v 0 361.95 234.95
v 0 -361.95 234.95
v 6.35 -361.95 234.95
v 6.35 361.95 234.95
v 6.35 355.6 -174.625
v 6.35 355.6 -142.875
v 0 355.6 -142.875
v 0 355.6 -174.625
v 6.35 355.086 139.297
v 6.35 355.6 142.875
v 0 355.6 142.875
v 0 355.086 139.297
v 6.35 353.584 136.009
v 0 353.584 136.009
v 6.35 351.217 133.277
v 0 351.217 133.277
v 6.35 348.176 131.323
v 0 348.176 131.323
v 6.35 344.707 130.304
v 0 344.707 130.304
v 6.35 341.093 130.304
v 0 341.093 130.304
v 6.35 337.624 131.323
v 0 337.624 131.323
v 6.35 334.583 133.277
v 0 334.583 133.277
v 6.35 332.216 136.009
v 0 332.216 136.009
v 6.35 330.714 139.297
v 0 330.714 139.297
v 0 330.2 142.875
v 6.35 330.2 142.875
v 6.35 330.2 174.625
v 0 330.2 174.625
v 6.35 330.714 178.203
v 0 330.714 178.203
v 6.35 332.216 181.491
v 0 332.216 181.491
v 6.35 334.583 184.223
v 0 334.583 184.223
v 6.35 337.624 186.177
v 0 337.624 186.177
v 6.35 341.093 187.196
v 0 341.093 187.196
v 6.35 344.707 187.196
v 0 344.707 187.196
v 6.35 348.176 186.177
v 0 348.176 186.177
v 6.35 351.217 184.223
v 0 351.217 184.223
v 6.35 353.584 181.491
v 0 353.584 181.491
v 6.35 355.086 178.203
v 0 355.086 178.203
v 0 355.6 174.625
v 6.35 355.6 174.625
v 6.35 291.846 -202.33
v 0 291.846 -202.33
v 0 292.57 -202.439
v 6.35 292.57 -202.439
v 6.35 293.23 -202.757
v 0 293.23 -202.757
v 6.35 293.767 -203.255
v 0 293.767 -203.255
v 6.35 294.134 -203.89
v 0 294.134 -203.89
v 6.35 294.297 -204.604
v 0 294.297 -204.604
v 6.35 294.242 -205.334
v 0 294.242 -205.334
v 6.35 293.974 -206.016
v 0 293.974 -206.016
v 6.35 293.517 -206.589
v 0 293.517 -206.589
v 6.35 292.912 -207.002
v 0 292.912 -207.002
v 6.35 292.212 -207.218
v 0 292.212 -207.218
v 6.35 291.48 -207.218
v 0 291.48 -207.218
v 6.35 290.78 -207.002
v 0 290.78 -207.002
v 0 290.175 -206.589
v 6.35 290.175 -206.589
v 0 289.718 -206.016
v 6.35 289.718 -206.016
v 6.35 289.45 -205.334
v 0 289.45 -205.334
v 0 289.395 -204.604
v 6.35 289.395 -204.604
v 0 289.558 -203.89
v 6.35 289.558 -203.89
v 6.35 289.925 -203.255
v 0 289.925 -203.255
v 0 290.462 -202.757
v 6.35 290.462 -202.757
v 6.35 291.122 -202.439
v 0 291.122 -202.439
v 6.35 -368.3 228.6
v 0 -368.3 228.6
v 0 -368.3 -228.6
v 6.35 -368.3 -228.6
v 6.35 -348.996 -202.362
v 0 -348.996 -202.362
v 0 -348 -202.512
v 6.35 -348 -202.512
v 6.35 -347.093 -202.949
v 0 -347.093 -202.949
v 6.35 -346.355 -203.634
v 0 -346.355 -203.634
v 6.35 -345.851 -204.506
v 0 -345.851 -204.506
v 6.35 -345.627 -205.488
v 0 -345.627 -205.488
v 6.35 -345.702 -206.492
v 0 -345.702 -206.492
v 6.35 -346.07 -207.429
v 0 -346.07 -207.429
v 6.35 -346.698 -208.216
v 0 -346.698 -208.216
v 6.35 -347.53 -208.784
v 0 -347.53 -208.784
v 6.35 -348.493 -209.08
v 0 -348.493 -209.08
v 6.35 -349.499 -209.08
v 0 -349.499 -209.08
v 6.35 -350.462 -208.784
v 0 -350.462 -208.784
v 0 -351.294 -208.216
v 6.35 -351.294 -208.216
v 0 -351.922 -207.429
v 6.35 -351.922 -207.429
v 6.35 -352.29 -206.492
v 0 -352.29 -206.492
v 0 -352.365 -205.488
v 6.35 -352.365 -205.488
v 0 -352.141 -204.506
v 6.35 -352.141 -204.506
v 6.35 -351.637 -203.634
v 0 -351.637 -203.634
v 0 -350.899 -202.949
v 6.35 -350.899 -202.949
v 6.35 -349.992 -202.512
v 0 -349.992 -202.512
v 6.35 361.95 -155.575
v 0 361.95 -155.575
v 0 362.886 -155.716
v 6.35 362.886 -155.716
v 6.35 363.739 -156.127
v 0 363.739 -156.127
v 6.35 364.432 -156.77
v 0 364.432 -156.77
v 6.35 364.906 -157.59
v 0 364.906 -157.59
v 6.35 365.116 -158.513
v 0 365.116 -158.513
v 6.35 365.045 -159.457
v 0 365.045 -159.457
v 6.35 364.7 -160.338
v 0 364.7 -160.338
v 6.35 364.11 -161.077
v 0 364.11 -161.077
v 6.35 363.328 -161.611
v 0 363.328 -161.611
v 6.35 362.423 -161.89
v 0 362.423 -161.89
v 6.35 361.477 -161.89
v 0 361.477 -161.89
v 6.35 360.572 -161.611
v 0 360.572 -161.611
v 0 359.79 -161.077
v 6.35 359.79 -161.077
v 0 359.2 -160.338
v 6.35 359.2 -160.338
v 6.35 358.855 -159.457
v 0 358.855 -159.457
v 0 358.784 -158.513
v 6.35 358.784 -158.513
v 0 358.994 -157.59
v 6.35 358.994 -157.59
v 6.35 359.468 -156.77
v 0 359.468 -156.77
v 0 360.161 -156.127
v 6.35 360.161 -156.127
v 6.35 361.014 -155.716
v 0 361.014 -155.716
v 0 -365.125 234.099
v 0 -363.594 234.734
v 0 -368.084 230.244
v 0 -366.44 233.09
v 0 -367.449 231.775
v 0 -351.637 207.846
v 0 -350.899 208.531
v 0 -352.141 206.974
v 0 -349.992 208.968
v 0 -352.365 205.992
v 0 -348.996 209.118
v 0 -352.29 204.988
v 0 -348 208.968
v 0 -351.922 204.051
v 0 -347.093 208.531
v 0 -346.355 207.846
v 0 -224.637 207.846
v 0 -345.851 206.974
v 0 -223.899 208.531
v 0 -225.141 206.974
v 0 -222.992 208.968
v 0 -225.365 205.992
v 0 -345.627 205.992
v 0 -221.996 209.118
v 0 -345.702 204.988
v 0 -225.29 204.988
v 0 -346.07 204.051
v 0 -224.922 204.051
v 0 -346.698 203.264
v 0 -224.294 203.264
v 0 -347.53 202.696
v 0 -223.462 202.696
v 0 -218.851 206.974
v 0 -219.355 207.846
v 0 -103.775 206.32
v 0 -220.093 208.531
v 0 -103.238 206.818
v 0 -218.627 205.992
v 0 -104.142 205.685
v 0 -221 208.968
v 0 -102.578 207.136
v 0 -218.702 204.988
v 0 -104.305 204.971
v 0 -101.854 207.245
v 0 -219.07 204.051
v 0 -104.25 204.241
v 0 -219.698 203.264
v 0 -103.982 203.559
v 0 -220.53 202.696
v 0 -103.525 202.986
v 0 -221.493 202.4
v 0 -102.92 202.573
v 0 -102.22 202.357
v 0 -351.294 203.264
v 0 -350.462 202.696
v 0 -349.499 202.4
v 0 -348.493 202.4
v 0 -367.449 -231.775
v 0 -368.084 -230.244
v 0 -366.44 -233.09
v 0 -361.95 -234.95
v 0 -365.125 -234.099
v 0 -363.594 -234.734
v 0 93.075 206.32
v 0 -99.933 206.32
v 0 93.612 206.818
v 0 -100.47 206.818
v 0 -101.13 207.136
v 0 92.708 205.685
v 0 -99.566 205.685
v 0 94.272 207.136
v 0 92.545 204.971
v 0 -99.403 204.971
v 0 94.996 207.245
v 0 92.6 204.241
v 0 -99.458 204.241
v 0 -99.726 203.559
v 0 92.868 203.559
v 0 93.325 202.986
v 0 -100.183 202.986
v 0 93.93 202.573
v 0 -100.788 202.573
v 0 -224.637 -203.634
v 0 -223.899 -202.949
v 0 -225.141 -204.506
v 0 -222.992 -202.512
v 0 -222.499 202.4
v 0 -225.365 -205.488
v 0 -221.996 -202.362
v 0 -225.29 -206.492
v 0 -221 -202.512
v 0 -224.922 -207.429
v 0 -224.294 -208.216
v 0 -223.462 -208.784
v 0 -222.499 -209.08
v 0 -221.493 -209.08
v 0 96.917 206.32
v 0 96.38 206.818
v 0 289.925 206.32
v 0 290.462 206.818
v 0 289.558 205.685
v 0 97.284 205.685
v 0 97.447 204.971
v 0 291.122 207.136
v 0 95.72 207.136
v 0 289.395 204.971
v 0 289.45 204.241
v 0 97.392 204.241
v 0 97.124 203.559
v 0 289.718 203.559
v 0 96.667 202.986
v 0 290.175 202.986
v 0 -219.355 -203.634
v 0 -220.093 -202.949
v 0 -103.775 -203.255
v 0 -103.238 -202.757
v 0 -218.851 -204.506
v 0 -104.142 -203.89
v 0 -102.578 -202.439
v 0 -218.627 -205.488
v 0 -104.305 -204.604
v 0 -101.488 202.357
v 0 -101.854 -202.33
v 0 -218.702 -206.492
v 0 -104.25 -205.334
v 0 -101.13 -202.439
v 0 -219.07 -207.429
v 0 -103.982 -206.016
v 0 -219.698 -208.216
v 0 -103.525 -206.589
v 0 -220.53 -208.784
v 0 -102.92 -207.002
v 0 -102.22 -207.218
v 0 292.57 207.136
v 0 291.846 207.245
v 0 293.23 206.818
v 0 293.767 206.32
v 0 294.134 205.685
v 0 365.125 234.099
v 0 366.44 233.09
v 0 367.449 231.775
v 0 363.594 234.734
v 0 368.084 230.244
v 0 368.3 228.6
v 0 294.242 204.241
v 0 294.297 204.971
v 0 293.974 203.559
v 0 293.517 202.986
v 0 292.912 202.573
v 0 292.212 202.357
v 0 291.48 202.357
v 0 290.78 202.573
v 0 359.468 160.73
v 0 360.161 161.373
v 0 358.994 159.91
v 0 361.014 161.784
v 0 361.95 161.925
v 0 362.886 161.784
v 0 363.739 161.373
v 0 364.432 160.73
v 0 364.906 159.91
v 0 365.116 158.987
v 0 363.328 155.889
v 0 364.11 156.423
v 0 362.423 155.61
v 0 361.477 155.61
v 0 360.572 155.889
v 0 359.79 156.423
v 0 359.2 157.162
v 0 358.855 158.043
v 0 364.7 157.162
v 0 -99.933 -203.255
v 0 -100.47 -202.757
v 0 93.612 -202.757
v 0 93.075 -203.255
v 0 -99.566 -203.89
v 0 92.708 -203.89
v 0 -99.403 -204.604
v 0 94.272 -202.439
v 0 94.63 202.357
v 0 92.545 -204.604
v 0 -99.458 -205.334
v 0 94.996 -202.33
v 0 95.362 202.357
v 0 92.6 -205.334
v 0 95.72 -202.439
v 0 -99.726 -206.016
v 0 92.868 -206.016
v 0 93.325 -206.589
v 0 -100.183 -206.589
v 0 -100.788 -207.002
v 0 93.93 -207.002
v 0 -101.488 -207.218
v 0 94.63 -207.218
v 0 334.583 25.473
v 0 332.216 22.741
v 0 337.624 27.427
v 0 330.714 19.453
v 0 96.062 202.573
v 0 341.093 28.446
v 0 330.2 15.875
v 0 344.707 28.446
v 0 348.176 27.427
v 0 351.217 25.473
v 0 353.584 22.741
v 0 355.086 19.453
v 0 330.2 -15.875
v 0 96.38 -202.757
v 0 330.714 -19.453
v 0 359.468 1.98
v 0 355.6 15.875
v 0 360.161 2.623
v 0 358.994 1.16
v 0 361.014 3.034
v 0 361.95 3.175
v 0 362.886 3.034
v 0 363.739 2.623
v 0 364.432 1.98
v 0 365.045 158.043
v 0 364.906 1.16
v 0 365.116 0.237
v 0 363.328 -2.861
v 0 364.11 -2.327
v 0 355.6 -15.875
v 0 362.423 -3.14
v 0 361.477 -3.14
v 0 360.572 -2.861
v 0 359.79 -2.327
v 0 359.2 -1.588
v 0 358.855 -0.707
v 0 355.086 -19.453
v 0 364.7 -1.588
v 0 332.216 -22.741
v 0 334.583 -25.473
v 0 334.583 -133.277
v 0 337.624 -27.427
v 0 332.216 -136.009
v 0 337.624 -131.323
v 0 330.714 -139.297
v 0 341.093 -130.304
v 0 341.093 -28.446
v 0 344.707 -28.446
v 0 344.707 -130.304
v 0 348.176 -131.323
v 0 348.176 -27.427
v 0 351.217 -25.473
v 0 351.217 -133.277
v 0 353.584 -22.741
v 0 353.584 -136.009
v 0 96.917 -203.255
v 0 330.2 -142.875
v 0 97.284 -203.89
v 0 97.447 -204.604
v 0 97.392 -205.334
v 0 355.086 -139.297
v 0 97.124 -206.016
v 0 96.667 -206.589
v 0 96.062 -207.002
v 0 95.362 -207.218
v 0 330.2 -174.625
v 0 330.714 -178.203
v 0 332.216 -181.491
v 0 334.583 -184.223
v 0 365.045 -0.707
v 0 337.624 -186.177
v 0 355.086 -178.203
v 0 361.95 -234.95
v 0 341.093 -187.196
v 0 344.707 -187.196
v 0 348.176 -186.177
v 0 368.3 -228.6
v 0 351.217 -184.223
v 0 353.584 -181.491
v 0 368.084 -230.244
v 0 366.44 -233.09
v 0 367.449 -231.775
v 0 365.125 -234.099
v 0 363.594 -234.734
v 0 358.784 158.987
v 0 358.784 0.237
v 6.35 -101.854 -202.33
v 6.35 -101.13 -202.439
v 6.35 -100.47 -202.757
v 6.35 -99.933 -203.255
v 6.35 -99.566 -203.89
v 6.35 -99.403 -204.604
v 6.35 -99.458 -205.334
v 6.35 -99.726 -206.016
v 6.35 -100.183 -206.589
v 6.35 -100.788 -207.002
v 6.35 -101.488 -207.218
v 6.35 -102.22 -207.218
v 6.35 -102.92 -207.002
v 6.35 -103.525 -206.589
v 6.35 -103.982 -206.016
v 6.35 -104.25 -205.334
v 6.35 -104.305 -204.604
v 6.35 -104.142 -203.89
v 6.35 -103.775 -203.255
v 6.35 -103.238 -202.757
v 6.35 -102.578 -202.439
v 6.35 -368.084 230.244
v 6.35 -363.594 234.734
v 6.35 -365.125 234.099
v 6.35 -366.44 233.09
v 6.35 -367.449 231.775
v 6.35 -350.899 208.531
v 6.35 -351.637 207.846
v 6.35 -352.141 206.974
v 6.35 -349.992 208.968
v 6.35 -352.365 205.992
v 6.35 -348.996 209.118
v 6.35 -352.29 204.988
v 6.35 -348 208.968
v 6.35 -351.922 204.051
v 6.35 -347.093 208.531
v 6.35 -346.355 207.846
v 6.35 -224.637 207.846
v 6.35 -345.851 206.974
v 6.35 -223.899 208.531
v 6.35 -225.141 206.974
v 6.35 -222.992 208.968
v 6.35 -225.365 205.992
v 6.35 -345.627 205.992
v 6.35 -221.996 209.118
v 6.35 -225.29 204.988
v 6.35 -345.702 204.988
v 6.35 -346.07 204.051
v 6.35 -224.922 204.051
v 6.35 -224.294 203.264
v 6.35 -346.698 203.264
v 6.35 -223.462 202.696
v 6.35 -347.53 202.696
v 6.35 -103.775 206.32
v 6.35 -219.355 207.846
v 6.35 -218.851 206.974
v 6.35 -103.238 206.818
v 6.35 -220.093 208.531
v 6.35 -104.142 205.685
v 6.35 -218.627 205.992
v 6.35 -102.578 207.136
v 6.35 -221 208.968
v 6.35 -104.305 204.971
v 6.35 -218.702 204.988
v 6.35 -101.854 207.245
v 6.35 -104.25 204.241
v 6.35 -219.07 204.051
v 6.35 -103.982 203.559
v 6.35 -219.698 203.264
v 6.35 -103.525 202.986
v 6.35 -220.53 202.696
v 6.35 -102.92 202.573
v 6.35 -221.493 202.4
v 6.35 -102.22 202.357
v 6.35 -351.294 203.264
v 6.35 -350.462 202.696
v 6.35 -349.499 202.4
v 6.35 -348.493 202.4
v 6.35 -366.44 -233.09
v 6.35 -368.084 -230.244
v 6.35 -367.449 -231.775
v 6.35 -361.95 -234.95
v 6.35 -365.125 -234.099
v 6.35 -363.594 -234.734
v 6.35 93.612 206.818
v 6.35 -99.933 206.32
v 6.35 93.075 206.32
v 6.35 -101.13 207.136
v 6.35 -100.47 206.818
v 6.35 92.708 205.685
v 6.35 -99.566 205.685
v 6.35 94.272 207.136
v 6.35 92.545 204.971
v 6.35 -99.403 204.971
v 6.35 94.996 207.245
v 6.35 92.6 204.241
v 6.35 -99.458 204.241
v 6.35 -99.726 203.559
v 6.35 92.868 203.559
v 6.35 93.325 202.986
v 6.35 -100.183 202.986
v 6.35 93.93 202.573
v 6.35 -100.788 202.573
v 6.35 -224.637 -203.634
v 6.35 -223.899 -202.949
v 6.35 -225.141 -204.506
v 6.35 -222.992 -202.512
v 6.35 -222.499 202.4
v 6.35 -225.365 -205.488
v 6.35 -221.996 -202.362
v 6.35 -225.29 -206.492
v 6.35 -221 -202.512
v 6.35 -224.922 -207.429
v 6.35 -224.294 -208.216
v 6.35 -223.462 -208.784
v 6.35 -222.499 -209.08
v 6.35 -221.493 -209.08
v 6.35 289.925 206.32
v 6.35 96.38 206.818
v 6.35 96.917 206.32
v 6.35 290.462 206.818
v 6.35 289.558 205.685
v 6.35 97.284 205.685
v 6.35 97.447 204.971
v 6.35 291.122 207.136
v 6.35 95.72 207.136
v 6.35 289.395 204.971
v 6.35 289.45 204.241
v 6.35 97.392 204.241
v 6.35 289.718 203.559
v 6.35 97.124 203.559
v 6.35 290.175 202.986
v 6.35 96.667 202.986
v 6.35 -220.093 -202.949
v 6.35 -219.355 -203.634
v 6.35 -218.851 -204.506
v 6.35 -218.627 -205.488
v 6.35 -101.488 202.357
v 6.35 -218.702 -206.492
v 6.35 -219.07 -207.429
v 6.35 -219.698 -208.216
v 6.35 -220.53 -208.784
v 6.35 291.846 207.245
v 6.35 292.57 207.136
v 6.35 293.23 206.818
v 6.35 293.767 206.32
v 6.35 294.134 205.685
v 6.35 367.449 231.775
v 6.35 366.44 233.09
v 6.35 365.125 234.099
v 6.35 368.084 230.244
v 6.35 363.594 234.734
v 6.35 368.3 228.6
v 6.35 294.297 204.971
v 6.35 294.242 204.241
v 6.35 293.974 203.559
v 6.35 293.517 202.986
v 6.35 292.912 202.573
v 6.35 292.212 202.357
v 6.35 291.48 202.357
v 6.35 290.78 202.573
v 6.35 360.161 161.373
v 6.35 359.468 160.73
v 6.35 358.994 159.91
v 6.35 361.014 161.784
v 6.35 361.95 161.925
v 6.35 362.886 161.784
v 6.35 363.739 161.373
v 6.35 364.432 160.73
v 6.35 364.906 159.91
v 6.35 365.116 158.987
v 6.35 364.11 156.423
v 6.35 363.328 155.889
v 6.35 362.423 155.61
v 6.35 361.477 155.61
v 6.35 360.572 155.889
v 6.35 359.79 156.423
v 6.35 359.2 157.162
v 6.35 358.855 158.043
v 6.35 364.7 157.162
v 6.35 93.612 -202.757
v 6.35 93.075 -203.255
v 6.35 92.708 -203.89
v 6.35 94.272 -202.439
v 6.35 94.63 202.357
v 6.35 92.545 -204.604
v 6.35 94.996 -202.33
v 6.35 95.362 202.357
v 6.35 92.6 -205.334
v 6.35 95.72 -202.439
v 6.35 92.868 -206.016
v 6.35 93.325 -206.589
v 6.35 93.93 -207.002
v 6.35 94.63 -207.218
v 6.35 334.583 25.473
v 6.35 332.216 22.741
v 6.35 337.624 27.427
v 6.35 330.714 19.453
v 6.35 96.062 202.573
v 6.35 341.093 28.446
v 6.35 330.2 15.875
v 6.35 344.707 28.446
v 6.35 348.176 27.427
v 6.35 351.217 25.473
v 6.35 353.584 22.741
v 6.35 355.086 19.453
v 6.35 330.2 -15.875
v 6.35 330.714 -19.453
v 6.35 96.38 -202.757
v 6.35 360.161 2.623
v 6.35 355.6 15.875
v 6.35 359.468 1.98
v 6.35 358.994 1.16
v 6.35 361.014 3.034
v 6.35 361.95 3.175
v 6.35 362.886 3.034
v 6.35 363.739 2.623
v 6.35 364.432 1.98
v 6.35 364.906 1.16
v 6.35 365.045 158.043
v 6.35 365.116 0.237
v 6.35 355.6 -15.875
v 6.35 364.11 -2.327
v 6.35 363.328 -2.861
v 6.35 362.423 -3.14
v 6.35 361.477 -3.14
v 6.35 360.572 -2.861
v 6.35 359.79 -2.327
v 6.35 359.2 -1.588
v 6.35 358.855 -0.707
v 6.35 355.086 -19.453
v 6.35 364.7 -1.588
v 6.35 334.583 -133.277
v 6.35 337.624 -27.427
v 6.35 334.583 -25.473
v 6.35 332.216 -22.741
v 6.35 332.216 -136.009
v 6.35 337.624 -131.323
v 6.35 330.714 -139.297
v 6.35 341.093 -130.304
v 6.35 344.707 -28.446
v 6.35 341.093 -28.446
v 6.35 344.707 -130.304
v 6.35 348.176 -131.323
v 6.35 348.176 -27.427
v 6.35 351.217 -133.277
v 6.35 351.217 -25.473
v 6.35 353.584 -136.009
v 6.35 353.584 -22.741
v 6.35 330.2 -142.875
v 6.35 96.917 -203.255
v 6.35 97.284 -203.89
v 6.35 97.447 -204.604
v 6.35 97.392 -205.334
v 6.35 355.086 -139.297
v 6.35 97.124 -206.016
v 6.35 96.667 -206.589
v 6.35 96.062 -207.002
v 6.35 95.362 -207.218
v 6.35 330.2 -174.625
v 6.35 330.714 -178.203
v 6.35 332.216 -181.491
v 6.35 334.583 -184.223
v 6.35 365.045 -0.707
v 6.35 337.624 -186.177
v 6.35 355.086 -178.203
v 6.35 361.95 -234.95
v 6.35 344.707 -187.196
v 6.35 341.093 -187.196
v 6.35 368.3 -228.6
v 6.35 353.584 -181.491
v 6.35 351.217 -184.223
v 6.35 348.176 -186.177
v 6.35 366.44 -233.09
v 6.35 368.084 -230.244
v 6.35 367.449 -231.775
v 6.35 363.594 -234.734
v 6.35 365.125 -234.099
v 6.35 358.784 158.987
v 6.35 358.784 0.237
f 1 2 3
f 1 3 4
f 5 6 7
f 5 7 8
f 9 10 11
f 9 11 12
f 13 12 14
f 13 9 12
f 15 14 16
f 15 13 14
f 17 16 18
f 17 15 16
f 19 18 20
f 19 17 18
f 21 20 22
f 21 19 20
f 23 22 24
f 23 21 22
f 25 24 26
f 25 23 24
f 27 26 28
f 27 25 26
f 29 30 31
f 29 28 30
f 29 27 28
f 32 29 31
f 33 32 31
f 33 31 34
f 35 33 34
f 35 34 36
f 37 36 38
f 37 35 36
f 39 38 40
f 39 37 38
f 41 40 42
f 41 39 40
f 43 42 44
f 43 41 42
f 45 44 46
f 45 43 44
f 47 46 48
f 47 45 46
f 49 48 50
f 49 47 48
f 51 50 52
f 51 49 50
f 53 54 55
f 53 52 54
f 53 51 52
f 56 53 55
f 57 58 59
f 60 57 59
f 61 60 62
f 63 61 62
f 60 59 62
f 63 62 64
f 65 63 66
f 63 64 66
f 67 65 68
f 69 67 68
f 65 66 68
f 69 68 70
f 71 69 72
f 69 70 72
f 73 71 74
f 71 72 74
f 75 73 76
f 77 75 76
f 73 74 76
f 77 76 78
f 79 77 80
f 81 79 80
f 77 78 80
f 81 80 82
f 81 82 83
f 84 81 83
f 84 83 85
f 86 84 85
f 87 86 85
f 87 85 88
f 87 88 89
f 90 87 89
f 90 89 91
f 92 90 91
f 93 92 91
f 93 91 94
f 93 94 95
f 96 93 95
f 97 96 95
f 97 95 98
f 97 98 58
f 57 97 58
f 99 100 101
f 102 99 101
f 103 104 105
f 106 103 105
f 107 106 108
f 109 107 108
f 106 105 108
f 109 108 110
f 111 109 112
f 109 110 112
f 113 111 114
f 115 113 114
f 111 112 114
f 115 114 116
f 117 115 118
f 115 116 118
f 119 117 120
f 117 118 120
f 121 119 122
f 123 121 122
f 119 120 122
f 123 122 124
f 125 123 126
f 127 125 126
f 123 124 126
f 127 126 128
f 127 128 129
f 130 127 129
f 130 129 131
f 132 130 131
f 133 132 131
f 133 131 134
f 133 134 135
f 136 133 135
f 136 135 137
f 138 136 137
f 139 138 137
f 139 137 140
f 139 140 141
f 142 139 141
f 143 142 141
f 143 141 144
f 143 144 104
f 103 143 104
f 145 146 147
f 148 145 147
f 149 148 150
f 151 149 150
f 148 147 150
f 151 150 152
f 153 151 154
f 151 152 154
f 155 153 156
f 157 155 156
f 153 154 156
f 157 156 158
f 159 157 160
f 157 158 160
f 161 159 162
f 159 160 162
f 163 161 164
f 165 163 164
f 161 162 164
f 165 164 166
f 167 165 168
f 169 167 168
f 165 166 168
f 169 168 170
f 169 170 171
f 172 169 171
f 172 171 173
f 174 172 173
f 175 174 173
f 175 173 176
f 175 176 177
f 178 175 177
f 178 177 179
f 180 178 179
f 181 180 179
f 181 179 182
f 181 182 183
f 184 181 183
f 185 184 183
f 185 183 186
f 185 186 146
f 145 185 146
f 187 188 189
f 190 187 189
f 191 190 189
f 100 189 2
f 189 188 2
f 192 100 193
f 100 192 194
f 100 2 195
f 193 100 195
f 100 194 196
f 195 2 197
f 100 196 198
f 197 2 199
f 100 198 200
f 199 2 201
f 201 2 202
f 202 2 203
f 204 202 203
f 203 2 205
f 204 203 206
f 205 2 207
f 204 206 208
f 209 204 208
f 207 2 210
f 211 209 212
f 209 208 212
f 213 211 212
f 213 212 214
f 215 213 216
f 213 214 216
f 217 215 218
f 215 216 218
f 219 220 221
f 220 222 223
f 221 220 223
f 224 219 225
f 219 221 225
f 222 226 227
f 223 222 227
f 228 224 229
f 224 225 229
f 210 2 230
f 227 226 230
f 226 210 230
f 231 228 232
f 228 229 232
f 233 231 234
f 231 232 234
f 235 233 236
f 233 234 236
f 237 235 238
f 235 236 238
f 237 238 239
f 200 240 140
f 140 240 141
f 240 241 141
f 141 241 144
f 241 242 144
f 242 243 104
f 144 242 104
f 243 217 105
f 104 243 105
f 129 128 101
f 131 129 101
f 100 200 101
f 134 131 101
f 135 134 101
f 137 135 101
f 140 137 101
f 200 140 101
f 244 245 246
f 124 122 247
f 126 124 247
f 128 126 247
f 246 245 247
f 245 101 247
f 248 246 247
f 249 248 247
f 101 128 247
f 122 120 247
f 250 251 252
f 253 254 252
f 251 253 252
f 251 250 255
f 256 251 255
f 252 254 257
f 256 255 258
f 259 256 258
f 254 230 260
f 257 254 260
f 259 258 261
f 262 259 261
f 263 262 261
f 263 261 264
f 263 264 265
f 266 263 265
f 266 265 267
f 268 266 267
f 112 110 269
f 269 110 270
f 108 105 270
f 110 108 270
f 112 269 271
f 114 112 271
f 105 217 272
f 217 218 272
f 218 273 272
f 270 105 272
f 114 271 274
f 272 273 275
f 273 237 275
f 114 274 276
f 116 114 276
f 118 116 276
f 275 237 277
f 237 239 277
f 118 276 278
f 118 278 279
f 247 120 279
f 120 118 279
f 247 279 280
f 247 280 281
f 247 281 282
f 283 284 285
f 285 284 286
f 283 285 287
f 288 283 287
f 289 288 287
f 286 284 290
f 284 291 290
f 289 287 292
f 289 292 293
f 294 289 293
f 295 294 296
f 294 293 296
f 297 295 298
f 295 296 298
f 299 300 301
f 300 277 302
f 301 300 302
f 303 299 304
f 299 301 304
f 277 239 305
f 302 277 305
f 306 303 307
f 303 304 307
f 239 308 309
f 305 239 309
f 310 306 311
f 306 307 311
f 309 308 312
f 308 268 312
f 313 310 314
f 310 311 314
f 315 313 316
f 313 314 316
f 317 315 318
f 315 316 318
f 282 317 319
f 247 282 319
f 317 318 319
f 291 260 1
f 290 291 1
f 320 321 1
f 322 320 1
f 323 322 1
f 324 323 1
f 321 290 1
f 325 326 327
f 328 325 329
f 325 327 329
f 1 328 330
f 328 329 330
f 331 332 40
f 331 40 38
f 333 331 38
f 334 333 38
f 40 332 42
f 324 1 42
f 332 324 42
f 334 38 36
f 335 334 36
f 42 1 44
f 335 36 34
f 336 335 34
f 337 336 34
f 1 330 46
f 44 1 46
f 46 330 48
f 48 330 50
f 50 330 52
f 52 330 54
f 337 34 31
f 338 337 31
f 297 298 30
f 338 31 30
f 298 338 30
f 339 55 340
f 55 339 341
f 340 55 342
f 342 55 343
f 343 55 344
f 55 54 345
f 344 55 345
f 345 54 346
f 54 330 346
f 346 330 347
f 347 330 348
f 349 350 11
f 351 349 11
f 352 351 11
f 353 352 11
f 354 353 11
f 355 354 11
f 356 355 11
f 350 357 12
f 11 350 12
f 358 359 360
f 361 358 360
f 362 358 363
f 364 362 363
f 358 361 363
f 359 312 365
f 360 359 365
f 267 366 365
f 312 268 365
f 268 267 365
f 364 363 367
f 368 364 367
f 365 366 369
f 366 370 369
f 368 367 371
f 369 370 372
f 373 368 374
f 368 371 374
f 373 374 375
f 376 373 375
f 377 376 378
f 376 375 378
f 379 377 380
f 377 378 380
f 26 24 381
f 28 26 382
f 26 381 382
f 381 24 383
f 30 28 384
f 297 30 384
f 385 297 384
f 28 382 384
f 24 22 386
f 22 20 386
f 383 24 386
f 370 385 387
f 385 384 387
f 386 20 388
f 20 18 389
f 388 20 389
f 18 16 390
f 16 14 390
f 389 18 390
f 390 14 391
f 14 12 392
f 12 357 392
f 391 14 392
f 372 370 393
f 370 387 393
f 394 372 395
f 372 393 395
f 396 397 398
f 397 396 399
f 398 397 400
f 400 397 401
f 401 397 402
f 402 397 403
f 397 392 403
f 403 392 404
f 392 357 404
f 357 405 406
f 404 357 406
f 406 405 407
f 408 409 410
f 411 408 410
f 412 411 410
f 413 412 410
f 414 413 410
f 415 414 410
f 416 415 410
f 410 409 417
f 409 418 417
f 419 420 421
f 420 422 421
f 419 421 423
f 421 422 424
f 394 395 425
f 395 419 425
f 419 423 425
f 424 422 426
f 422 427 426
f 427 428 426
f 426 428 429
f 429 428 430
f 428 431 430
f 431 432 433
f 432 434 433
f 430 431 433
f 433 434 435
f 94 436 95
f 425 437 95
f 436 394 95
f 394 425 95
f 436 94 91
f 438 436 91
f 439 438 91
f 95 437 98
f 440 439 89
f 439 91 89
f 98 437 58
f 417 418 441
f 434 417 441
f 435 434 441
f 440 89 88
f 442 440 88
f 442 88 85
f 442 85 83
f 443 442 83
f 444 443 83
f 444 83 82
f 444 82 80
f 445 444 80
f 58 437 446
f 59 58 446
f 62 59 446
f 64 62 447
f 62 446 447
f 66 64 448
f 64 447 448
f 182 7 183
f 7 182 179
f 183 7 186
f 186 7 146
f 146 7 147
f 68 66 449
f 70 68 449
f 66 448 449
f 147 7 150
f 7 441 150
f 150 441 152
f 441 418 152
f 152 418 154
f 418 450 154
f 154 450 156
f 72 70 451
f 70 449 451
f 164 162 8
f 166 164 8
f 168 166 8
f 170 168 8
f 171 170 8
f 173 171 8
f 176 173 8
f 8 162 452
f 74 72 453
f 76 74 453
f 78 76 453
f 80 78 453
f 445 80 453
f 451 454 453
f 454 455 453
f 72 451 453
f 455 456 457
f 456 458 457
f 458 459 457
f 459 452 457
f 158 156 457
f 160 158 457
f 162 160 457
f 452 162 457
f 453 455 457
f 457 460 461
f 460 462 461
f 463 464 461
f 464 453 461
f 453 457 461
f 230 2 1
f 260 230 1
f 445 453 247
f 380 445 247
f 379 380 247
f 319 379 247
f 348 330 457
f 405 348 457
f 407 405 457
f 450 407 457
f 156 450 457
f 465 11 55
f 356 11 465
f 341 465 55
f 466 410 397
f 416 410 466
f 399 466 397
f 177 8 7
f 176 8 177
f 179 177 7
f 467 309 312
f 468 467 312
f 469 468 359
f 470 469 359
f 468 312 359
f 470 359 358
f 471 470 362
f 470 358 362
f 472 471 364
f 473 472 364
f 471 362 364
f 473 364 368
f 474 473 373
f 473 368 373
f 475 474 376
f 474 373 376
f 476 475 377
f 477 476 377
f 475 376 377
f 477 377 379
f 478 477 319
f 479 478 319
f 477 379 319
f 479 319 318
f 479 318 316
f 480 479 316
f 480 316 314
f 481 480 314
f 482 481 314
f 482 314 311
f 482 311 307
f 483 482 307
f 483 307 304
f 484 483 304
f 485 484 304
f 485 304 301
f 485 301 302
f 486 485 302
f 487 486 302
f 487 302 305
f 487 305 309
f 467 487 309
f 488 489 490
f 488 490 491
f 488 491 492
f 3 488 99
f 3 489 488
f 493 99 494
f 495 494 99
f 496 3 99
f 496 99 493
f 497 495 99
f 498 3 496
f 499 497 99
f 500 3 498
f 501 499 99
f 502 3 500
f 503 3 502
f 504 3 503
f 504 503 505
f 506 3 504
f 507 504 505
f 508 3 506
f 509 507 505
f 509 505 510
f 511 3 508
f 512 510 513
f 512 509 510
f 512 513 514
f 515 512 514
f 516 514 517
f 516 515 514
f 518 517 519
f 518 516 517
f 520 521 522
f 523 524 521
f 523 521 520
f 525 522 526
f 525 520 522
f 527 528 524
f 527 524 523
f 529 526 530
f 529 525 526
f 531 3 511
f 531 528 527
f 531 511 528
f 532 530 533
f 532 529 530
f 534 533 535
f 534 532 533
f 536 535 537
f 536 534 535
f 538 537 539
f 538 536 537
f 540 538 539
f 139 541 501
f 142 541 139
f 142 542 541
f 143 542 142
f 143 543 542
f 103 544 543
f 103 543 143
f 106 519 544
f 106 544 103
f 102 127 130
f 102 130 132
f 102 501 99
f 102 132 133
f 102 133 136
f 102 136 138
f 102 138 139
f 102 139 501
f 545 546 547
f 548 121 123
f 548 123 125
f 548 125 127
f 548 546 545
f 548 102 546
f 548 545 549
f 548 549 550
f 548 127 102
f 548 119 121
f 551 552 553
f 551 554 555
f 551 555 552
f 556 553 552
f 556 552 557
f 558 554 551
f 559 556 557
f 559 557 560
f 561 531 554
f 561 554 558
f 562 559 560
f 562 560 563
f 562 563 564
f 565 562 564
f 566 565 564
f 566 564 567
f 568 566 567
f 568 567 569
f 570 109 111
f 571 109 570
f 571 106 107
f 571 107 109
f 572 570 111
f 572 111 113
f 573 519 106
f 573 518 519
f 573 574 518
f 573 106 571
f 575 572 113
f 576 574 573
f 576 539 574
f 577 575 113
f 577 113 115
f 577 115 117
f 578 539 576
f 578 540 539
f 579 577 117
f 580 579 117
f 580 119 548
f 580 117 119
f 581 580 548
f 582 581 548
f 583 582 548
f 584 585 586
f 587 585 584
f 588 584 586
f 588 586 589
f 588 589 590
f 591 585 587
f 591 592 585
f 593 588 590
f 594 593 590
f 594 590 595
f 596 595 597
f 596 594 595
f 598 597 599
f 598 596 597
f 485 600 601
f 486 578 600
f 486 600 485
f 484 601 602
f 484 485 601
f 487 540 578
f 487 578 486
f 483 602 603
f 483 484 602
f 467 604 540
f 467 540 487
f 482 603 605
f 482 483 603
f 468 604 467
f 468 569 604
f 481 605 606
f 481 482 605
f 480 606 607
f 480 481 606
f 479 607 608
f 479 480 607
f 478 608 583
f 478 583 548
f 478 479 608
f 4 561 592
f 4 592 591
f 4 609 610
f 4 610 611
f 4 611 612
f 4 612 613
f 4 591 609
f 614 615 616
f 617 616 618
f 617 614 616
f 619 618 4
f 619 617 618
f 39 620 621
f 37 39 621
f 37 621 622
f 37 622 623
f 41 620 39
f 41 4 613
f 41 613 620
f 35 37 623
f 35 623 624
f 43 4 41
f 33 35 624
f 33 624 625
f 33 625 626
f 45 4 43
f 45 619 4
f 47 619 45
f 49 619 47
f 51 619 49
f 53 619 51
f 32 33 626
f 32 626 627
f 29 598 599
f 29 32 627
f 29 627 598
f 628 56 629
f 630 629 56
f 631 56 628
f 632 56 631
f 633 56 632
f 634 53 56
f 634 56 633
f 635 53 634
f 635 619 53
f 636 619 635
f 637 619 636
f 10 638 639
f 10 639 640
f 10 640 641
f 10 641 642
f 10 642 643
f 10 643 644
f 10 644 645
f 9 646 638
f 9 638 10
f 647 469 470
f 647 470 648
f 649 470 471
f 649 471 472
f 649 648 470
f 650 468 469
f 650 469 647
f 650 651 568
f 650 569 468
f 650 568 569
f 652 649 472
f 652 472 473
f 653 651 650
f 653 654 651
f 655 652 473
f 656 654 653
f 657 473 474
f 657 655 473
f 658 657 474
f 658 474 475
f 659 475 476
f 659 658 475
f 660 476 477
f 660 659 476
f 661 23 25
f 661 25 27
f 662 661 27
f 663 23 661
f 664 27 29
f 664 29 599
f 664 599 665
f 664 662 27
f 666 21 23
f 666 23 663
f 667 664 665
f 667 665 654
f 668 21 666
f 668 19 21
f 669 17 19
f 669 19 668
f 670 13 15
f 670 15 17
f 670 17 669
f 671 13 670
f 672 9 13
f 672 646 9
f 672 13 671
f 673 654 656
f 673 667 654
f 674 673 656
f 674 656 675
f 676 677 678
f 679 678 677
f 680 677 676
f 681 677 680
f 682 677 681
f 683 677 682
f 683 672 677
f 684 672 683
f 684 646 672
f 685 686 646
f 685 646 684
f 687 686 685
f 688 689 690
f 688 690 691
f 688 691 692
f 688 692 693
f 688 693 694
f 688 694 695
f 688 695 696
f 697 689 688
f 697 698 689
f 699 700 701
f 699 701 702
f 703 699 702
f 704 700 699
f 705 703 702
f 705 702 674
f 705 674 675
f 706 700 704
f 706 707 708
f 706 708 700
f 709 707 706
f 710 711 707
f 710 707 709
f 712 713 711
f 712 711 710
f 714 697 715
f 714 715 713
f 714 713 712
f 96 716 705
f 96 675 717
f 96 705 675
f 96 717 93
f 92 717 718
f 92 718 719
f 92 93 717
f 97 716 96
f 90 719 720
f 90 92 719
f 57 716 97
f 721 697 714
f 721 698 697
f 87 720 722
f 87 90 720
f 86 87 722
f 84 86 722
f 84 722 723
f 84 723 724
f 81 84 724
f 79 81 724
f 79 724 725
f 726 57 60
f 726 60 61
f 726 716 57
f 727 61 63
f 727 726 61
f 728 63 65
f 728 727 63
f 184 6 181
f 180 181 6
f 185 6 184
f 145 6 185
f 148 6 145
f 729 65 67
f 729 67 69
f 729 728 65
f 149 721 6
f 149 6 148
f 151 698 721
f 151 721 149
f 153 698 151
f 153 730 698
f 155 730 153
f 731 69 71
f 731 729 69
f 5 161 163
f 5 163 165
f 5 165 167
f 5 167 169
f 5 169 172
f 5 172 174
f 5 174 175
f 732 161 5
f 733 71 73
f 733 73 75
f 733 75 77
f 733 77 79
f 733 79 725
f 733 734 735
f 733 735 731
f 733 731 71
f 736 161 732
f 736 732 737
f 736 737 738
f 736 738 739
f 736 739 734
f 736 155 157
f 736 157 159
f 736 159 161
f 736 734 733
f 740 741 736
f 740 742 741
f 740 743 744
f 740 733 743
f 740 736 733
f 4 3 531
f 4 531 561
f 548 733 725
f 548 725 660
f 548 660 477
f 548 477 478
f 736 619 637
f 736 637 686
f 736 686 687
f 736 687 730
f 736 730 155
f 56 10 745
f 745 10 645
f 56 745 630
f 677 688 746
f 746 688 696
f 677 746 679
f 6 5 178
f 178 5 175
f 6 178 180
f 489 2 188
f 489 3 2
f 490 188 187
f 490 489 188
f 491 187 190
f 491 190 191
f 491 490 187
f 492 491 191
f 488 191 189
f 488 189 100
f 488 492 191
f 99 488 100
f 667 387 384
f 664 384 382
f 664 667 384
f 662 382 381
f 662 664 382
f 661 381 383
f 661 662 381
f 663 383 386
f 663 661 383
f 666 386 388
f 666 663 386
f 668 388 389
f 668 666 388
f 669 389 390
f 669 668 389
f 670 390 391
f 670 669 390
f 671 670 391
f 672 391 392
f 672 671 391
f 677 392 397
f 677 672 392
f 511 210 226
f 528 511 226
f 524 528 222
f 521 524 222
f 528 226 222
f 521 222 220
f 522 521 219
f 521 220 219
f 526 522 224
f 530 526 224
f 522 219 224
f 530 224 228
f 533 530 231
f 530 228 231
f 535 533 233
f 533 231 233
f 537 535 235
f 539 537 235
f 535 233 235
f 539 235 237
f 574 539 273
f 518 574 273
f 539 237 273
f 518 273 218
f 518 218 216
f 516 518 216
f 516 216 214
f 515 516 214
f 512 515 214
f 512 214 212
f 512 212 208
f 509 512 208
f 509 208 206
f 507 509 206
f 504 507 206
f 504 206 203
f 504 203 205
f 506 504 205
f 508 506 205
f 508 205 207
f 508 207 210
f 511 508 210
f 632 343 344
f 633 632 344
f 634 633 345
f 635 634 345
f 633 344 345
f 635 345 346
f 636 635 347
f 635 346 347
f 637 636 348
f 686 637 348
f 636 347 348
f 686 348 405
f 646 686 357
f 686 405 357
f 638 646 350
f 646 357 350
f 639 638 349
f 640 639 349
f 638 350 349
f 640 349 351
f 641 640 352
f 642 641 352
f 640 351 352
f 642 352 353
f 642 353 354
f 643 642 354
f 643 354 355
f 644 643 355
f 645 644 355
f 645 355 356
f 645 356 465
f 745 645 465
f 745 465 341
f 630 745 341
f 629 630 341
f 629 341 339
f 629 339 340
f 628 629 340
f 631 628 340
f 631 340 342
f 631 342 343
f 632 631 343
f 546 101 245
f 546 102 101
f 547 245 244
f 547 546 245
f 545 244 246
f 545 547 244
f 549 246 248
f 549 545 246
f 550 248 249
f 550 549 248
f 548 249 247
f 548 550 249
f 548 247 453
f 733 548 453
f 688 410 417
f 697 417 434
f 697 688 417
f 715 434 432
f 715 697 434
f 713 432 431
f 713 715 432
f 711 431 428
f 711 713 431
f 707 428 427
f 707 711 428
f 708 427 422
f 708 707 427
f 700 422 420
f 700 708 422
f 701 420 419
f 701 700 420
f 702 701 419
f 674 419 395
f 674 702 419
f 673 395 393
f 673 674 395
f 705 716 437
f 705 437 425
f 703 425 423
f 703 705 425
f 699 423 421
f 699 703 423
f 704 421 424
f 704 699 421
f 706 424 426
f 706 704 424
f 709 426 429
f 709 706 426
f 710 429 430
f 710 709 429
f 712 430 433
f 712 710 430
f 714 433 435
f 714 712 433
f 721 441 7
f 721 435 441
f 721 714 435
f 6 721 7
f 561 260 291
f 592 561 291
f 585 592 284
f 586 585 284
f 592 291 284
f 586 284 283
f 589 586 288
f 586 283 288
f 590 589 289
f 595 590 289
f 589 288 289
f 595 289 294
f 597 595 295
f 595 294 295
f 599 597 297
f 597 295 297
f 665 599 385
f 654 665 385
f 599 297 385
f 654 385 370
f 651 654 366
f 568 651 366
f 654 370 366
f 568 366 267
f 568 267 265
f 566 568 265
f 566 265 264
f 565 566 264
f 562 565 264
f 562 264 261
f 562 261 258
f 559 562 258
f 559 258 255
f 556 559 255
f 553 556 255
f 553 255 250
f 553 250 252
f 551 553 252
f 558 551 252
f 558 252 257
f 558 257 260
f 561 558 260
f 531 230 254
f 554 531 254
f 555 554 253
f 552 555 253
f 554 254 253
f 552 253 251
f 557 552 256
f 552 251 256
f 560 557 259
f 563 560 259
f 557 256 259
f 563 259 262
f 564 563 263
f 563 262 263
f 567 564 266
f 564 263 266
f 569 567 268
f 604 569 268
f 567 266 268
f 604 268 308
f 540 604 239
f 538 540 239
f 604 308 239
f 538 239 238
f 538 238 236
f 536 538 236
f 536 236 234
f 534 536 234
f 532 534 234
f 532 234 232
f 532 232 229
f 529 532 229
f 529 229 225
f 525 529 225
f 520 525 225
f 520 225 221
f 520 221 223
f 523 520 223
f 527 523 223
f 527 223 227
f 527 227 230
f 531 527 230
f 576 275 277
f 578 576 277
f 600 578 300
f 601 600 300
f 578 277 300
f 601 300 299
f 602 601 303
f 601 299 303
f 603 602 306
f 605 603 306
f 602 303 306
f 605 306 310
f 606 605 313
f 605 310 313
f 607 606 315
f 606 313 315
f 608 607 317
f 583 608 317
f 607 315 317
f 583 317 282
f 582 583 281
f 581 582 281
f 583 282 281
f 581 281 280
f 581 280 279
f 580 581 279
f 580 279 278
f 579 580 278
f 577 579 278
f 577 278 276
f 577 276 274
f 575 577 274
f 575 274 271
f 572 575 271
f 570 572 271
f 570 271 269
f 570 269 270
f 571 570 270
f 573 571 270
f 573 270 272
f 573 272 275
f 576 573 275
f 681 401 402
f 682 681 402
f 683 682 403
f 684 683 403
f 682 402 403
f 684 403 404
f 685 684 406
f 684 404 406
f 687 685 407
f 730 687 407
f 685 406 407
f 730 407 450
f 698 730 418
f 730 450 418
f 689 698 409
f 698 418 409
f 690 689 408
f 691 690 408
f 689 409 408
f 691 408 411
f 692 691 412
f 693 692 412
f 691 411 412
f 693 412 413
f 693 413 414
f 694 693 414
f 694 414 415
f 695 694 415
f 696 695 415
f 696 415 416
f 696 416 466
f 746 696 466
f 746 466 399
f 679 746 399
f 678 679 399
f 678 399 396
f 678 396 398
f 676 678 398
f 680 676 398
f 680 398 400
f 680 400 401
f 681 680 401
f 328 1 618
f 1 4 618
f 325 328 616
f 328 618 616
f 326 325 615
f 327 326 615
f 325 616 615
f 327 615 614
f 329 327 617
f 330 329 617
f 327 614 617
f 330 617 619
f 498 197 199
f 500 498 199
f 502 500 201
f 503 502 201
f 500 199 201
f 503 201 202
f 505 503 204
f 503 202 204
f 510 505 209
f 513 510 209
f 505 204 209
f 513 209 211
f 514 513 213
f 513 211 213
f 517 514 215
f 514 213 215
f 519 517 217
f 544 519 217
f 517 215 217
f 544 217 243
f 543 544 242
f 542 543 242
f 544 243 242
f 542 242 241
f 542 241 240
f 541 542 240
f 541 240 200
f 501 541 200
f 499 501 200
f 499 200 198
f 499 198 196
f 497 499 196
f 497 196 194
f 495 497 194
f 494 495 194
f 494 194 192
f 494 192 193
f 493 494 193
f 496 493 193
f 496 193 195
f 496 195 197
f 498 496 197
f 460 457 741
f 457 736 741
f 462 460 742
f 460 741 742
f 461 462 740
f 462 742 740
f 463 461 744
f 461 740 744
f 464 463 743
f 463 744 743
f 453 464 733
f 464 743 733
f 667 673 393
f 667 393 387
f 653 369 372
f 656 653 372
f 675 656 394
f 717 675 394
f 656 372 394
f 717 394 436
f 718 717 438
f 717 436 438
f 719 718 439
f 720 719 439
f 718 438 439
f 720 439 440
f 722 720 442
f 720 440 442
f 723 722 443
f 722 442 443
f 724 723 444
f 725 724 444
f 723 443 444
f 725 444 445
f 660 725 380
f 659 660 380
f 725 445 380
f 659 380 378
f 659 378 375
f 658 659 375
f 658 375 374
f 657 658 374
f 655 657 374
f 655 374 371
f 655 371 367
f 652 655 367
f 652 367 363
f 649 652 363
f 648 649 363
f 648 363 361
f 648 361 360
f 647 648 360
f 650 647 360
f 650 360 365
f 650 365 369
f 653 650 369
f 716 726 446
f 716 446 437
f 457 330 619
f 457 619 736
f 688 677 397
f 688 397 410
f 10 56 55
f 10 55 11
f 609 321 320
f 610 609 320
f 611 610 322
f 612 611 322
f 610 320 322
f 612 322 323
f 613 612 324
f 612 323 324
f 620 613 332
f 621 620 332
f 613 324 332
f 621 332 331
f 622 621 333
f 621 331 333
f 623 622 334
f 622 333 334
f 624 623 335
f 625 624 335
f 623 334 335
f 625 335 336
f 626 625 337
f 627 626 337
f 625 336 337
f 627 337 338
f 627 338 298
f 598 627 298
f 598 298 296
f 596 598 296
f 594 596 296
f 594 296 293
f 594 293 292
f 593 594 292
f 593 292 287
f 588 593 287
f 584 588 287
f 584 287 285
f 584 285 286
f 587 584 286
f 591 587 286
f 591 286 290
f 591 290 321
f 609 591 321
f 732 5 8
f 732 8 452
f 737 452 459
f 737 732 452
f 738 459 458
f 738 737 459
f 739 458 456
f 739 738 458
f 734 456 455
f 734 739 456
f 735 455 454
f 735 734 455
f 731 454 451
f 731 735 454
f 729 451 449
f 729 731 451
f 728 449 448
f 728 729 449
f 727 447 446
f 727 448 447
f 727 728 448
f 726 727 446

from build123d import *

# Parameters (mm, degrees)
SKETCH1_W                    = 469.9
SKETCH1_H                    = 736.6
BOSS_EXTRUDE1_DEPTH          = 6.35
F_10_0_1935_DIAMETER_HOLE1_D = 4.9149
H_0_266_DIAMETER_HOLE1_D     = 6.7564
CUT_EXTRUDE1_DEPTH           = 7.35
FILLET1_R                    = 6.35
E_0_25_DIAMETER_HOLE1_D      = 6.35


with BuildPart() as part:
    # Sketch1 → Boss-Extrude1 (new body)
    with BuildSketch(Plane(origin=(0, 0, 0), x_dir=(0, 0, -1), z_dir=(1, 0, 0))):
        Rectangle(SKETCH1_W, SKETCH1_H)
    extrude(amount=BOSS_EXTRUDE1_DEPTH)

    # #10 (0.1935) Diameter Hole1 (through all)
    with Locations(Plane(origin=(6.35, 0, 0), x_dir=(0, 0, -1), z_dir=(1, 0, 0))):
        with Locations((-204.7875, 291.846), (-204.7875, 94.996), (-204.7875, -101.854), (204.7875, 94.996), (204.7875, 291.846), (204.7875, -101.854)):
            Hole(F_10_0_1935_DIAMETER_HOLE1_D / 2)

    # H (0.266) Diameter Hole1 (through all)
    with Locations(Plane(origin=(6.35, 0, 0), x_dir=(0, 0, -1), z_dir=(1, 0, 0))):
        with Locations((-205.74, -221.996), (-205.74, -348.996), (205.74, -221.996), (205.74, -348.996)):
            Hole(H_0_266_DIAMETER_HOLE1_D / 2)

    # Sketch7 → Cut-Extrude1 (cut, through all)
    with BuildSketch(Plane(origin=(6.35, 0, 0), x_dir=(0, 0, -1), z_dir=(1, 0, 0))):
        with BuildLine():
            Line((-174.625, 355.6), (-142.875, 355.6))
            ThreePointArc((-142.875, 355.6), (-130.175, 342.9), (-142.875, 330.2))
            Line((-142.875, 330.2), (-174.625, 330.2))
            ThreePointArc((-174.625, 330.2), (-187.325, 342.9), (-174.625, 355.6))
        make_face()
        with BuildLine():
            Line((-15.875, 355.6), (15.875, 355.6))
            ThreePointArc((15.875, 355.6), (28.575, 342.9), (15.875, 330.2))
            Line((15.875, 330.2), (-15.875, 330.2))
            ThreePointArc((-15.875, 330.2), (-28.575, 342.9), (-15.875, 355.6))
        make_face()
        with BuildLine():
            Line((142.875, 355.6), (174.625, 355.6))
            ThreePointArc((174.625, 355.6), (187.325, 342.9), (174.625, 330.2))
            Line((174.625, 330.2), (142.875, 330.2))
            ThreePointArc((142.875, 330.2), (130.175, 342.9), (142.875, 355.6))
        make_face()
    extrude(amount=-CUT_EXTRUDE1_DEPTH, mode=Mode.SUBTRACT)

    # Fillet1
    fillet1_edges = [part.edges().sort_by_distance(p)[0] for p in [
        (3.175, -368.3, -234.95),
        (3.175, -368.3, 234.95),
        (3.175, 368.3, 234.95),
        (3.175, 368.3, -234.95),
    ]]
    fillet(fillet1_edges, radius=FILLET1_R)

    # E (0.25) Diameter Hole1 (through all)
    with Locations(Plane(origin=(6.35, 0, 0), x_dir=(0, 0, -1), z_dir=(1, 0, 0))):
        with Locations((-158.75, 361.95), (0, 361.95), (158.75, 361.95)):
            Hole(E_0_25_DIAMETER_HOLE1_D / 2)


solid = part.part
